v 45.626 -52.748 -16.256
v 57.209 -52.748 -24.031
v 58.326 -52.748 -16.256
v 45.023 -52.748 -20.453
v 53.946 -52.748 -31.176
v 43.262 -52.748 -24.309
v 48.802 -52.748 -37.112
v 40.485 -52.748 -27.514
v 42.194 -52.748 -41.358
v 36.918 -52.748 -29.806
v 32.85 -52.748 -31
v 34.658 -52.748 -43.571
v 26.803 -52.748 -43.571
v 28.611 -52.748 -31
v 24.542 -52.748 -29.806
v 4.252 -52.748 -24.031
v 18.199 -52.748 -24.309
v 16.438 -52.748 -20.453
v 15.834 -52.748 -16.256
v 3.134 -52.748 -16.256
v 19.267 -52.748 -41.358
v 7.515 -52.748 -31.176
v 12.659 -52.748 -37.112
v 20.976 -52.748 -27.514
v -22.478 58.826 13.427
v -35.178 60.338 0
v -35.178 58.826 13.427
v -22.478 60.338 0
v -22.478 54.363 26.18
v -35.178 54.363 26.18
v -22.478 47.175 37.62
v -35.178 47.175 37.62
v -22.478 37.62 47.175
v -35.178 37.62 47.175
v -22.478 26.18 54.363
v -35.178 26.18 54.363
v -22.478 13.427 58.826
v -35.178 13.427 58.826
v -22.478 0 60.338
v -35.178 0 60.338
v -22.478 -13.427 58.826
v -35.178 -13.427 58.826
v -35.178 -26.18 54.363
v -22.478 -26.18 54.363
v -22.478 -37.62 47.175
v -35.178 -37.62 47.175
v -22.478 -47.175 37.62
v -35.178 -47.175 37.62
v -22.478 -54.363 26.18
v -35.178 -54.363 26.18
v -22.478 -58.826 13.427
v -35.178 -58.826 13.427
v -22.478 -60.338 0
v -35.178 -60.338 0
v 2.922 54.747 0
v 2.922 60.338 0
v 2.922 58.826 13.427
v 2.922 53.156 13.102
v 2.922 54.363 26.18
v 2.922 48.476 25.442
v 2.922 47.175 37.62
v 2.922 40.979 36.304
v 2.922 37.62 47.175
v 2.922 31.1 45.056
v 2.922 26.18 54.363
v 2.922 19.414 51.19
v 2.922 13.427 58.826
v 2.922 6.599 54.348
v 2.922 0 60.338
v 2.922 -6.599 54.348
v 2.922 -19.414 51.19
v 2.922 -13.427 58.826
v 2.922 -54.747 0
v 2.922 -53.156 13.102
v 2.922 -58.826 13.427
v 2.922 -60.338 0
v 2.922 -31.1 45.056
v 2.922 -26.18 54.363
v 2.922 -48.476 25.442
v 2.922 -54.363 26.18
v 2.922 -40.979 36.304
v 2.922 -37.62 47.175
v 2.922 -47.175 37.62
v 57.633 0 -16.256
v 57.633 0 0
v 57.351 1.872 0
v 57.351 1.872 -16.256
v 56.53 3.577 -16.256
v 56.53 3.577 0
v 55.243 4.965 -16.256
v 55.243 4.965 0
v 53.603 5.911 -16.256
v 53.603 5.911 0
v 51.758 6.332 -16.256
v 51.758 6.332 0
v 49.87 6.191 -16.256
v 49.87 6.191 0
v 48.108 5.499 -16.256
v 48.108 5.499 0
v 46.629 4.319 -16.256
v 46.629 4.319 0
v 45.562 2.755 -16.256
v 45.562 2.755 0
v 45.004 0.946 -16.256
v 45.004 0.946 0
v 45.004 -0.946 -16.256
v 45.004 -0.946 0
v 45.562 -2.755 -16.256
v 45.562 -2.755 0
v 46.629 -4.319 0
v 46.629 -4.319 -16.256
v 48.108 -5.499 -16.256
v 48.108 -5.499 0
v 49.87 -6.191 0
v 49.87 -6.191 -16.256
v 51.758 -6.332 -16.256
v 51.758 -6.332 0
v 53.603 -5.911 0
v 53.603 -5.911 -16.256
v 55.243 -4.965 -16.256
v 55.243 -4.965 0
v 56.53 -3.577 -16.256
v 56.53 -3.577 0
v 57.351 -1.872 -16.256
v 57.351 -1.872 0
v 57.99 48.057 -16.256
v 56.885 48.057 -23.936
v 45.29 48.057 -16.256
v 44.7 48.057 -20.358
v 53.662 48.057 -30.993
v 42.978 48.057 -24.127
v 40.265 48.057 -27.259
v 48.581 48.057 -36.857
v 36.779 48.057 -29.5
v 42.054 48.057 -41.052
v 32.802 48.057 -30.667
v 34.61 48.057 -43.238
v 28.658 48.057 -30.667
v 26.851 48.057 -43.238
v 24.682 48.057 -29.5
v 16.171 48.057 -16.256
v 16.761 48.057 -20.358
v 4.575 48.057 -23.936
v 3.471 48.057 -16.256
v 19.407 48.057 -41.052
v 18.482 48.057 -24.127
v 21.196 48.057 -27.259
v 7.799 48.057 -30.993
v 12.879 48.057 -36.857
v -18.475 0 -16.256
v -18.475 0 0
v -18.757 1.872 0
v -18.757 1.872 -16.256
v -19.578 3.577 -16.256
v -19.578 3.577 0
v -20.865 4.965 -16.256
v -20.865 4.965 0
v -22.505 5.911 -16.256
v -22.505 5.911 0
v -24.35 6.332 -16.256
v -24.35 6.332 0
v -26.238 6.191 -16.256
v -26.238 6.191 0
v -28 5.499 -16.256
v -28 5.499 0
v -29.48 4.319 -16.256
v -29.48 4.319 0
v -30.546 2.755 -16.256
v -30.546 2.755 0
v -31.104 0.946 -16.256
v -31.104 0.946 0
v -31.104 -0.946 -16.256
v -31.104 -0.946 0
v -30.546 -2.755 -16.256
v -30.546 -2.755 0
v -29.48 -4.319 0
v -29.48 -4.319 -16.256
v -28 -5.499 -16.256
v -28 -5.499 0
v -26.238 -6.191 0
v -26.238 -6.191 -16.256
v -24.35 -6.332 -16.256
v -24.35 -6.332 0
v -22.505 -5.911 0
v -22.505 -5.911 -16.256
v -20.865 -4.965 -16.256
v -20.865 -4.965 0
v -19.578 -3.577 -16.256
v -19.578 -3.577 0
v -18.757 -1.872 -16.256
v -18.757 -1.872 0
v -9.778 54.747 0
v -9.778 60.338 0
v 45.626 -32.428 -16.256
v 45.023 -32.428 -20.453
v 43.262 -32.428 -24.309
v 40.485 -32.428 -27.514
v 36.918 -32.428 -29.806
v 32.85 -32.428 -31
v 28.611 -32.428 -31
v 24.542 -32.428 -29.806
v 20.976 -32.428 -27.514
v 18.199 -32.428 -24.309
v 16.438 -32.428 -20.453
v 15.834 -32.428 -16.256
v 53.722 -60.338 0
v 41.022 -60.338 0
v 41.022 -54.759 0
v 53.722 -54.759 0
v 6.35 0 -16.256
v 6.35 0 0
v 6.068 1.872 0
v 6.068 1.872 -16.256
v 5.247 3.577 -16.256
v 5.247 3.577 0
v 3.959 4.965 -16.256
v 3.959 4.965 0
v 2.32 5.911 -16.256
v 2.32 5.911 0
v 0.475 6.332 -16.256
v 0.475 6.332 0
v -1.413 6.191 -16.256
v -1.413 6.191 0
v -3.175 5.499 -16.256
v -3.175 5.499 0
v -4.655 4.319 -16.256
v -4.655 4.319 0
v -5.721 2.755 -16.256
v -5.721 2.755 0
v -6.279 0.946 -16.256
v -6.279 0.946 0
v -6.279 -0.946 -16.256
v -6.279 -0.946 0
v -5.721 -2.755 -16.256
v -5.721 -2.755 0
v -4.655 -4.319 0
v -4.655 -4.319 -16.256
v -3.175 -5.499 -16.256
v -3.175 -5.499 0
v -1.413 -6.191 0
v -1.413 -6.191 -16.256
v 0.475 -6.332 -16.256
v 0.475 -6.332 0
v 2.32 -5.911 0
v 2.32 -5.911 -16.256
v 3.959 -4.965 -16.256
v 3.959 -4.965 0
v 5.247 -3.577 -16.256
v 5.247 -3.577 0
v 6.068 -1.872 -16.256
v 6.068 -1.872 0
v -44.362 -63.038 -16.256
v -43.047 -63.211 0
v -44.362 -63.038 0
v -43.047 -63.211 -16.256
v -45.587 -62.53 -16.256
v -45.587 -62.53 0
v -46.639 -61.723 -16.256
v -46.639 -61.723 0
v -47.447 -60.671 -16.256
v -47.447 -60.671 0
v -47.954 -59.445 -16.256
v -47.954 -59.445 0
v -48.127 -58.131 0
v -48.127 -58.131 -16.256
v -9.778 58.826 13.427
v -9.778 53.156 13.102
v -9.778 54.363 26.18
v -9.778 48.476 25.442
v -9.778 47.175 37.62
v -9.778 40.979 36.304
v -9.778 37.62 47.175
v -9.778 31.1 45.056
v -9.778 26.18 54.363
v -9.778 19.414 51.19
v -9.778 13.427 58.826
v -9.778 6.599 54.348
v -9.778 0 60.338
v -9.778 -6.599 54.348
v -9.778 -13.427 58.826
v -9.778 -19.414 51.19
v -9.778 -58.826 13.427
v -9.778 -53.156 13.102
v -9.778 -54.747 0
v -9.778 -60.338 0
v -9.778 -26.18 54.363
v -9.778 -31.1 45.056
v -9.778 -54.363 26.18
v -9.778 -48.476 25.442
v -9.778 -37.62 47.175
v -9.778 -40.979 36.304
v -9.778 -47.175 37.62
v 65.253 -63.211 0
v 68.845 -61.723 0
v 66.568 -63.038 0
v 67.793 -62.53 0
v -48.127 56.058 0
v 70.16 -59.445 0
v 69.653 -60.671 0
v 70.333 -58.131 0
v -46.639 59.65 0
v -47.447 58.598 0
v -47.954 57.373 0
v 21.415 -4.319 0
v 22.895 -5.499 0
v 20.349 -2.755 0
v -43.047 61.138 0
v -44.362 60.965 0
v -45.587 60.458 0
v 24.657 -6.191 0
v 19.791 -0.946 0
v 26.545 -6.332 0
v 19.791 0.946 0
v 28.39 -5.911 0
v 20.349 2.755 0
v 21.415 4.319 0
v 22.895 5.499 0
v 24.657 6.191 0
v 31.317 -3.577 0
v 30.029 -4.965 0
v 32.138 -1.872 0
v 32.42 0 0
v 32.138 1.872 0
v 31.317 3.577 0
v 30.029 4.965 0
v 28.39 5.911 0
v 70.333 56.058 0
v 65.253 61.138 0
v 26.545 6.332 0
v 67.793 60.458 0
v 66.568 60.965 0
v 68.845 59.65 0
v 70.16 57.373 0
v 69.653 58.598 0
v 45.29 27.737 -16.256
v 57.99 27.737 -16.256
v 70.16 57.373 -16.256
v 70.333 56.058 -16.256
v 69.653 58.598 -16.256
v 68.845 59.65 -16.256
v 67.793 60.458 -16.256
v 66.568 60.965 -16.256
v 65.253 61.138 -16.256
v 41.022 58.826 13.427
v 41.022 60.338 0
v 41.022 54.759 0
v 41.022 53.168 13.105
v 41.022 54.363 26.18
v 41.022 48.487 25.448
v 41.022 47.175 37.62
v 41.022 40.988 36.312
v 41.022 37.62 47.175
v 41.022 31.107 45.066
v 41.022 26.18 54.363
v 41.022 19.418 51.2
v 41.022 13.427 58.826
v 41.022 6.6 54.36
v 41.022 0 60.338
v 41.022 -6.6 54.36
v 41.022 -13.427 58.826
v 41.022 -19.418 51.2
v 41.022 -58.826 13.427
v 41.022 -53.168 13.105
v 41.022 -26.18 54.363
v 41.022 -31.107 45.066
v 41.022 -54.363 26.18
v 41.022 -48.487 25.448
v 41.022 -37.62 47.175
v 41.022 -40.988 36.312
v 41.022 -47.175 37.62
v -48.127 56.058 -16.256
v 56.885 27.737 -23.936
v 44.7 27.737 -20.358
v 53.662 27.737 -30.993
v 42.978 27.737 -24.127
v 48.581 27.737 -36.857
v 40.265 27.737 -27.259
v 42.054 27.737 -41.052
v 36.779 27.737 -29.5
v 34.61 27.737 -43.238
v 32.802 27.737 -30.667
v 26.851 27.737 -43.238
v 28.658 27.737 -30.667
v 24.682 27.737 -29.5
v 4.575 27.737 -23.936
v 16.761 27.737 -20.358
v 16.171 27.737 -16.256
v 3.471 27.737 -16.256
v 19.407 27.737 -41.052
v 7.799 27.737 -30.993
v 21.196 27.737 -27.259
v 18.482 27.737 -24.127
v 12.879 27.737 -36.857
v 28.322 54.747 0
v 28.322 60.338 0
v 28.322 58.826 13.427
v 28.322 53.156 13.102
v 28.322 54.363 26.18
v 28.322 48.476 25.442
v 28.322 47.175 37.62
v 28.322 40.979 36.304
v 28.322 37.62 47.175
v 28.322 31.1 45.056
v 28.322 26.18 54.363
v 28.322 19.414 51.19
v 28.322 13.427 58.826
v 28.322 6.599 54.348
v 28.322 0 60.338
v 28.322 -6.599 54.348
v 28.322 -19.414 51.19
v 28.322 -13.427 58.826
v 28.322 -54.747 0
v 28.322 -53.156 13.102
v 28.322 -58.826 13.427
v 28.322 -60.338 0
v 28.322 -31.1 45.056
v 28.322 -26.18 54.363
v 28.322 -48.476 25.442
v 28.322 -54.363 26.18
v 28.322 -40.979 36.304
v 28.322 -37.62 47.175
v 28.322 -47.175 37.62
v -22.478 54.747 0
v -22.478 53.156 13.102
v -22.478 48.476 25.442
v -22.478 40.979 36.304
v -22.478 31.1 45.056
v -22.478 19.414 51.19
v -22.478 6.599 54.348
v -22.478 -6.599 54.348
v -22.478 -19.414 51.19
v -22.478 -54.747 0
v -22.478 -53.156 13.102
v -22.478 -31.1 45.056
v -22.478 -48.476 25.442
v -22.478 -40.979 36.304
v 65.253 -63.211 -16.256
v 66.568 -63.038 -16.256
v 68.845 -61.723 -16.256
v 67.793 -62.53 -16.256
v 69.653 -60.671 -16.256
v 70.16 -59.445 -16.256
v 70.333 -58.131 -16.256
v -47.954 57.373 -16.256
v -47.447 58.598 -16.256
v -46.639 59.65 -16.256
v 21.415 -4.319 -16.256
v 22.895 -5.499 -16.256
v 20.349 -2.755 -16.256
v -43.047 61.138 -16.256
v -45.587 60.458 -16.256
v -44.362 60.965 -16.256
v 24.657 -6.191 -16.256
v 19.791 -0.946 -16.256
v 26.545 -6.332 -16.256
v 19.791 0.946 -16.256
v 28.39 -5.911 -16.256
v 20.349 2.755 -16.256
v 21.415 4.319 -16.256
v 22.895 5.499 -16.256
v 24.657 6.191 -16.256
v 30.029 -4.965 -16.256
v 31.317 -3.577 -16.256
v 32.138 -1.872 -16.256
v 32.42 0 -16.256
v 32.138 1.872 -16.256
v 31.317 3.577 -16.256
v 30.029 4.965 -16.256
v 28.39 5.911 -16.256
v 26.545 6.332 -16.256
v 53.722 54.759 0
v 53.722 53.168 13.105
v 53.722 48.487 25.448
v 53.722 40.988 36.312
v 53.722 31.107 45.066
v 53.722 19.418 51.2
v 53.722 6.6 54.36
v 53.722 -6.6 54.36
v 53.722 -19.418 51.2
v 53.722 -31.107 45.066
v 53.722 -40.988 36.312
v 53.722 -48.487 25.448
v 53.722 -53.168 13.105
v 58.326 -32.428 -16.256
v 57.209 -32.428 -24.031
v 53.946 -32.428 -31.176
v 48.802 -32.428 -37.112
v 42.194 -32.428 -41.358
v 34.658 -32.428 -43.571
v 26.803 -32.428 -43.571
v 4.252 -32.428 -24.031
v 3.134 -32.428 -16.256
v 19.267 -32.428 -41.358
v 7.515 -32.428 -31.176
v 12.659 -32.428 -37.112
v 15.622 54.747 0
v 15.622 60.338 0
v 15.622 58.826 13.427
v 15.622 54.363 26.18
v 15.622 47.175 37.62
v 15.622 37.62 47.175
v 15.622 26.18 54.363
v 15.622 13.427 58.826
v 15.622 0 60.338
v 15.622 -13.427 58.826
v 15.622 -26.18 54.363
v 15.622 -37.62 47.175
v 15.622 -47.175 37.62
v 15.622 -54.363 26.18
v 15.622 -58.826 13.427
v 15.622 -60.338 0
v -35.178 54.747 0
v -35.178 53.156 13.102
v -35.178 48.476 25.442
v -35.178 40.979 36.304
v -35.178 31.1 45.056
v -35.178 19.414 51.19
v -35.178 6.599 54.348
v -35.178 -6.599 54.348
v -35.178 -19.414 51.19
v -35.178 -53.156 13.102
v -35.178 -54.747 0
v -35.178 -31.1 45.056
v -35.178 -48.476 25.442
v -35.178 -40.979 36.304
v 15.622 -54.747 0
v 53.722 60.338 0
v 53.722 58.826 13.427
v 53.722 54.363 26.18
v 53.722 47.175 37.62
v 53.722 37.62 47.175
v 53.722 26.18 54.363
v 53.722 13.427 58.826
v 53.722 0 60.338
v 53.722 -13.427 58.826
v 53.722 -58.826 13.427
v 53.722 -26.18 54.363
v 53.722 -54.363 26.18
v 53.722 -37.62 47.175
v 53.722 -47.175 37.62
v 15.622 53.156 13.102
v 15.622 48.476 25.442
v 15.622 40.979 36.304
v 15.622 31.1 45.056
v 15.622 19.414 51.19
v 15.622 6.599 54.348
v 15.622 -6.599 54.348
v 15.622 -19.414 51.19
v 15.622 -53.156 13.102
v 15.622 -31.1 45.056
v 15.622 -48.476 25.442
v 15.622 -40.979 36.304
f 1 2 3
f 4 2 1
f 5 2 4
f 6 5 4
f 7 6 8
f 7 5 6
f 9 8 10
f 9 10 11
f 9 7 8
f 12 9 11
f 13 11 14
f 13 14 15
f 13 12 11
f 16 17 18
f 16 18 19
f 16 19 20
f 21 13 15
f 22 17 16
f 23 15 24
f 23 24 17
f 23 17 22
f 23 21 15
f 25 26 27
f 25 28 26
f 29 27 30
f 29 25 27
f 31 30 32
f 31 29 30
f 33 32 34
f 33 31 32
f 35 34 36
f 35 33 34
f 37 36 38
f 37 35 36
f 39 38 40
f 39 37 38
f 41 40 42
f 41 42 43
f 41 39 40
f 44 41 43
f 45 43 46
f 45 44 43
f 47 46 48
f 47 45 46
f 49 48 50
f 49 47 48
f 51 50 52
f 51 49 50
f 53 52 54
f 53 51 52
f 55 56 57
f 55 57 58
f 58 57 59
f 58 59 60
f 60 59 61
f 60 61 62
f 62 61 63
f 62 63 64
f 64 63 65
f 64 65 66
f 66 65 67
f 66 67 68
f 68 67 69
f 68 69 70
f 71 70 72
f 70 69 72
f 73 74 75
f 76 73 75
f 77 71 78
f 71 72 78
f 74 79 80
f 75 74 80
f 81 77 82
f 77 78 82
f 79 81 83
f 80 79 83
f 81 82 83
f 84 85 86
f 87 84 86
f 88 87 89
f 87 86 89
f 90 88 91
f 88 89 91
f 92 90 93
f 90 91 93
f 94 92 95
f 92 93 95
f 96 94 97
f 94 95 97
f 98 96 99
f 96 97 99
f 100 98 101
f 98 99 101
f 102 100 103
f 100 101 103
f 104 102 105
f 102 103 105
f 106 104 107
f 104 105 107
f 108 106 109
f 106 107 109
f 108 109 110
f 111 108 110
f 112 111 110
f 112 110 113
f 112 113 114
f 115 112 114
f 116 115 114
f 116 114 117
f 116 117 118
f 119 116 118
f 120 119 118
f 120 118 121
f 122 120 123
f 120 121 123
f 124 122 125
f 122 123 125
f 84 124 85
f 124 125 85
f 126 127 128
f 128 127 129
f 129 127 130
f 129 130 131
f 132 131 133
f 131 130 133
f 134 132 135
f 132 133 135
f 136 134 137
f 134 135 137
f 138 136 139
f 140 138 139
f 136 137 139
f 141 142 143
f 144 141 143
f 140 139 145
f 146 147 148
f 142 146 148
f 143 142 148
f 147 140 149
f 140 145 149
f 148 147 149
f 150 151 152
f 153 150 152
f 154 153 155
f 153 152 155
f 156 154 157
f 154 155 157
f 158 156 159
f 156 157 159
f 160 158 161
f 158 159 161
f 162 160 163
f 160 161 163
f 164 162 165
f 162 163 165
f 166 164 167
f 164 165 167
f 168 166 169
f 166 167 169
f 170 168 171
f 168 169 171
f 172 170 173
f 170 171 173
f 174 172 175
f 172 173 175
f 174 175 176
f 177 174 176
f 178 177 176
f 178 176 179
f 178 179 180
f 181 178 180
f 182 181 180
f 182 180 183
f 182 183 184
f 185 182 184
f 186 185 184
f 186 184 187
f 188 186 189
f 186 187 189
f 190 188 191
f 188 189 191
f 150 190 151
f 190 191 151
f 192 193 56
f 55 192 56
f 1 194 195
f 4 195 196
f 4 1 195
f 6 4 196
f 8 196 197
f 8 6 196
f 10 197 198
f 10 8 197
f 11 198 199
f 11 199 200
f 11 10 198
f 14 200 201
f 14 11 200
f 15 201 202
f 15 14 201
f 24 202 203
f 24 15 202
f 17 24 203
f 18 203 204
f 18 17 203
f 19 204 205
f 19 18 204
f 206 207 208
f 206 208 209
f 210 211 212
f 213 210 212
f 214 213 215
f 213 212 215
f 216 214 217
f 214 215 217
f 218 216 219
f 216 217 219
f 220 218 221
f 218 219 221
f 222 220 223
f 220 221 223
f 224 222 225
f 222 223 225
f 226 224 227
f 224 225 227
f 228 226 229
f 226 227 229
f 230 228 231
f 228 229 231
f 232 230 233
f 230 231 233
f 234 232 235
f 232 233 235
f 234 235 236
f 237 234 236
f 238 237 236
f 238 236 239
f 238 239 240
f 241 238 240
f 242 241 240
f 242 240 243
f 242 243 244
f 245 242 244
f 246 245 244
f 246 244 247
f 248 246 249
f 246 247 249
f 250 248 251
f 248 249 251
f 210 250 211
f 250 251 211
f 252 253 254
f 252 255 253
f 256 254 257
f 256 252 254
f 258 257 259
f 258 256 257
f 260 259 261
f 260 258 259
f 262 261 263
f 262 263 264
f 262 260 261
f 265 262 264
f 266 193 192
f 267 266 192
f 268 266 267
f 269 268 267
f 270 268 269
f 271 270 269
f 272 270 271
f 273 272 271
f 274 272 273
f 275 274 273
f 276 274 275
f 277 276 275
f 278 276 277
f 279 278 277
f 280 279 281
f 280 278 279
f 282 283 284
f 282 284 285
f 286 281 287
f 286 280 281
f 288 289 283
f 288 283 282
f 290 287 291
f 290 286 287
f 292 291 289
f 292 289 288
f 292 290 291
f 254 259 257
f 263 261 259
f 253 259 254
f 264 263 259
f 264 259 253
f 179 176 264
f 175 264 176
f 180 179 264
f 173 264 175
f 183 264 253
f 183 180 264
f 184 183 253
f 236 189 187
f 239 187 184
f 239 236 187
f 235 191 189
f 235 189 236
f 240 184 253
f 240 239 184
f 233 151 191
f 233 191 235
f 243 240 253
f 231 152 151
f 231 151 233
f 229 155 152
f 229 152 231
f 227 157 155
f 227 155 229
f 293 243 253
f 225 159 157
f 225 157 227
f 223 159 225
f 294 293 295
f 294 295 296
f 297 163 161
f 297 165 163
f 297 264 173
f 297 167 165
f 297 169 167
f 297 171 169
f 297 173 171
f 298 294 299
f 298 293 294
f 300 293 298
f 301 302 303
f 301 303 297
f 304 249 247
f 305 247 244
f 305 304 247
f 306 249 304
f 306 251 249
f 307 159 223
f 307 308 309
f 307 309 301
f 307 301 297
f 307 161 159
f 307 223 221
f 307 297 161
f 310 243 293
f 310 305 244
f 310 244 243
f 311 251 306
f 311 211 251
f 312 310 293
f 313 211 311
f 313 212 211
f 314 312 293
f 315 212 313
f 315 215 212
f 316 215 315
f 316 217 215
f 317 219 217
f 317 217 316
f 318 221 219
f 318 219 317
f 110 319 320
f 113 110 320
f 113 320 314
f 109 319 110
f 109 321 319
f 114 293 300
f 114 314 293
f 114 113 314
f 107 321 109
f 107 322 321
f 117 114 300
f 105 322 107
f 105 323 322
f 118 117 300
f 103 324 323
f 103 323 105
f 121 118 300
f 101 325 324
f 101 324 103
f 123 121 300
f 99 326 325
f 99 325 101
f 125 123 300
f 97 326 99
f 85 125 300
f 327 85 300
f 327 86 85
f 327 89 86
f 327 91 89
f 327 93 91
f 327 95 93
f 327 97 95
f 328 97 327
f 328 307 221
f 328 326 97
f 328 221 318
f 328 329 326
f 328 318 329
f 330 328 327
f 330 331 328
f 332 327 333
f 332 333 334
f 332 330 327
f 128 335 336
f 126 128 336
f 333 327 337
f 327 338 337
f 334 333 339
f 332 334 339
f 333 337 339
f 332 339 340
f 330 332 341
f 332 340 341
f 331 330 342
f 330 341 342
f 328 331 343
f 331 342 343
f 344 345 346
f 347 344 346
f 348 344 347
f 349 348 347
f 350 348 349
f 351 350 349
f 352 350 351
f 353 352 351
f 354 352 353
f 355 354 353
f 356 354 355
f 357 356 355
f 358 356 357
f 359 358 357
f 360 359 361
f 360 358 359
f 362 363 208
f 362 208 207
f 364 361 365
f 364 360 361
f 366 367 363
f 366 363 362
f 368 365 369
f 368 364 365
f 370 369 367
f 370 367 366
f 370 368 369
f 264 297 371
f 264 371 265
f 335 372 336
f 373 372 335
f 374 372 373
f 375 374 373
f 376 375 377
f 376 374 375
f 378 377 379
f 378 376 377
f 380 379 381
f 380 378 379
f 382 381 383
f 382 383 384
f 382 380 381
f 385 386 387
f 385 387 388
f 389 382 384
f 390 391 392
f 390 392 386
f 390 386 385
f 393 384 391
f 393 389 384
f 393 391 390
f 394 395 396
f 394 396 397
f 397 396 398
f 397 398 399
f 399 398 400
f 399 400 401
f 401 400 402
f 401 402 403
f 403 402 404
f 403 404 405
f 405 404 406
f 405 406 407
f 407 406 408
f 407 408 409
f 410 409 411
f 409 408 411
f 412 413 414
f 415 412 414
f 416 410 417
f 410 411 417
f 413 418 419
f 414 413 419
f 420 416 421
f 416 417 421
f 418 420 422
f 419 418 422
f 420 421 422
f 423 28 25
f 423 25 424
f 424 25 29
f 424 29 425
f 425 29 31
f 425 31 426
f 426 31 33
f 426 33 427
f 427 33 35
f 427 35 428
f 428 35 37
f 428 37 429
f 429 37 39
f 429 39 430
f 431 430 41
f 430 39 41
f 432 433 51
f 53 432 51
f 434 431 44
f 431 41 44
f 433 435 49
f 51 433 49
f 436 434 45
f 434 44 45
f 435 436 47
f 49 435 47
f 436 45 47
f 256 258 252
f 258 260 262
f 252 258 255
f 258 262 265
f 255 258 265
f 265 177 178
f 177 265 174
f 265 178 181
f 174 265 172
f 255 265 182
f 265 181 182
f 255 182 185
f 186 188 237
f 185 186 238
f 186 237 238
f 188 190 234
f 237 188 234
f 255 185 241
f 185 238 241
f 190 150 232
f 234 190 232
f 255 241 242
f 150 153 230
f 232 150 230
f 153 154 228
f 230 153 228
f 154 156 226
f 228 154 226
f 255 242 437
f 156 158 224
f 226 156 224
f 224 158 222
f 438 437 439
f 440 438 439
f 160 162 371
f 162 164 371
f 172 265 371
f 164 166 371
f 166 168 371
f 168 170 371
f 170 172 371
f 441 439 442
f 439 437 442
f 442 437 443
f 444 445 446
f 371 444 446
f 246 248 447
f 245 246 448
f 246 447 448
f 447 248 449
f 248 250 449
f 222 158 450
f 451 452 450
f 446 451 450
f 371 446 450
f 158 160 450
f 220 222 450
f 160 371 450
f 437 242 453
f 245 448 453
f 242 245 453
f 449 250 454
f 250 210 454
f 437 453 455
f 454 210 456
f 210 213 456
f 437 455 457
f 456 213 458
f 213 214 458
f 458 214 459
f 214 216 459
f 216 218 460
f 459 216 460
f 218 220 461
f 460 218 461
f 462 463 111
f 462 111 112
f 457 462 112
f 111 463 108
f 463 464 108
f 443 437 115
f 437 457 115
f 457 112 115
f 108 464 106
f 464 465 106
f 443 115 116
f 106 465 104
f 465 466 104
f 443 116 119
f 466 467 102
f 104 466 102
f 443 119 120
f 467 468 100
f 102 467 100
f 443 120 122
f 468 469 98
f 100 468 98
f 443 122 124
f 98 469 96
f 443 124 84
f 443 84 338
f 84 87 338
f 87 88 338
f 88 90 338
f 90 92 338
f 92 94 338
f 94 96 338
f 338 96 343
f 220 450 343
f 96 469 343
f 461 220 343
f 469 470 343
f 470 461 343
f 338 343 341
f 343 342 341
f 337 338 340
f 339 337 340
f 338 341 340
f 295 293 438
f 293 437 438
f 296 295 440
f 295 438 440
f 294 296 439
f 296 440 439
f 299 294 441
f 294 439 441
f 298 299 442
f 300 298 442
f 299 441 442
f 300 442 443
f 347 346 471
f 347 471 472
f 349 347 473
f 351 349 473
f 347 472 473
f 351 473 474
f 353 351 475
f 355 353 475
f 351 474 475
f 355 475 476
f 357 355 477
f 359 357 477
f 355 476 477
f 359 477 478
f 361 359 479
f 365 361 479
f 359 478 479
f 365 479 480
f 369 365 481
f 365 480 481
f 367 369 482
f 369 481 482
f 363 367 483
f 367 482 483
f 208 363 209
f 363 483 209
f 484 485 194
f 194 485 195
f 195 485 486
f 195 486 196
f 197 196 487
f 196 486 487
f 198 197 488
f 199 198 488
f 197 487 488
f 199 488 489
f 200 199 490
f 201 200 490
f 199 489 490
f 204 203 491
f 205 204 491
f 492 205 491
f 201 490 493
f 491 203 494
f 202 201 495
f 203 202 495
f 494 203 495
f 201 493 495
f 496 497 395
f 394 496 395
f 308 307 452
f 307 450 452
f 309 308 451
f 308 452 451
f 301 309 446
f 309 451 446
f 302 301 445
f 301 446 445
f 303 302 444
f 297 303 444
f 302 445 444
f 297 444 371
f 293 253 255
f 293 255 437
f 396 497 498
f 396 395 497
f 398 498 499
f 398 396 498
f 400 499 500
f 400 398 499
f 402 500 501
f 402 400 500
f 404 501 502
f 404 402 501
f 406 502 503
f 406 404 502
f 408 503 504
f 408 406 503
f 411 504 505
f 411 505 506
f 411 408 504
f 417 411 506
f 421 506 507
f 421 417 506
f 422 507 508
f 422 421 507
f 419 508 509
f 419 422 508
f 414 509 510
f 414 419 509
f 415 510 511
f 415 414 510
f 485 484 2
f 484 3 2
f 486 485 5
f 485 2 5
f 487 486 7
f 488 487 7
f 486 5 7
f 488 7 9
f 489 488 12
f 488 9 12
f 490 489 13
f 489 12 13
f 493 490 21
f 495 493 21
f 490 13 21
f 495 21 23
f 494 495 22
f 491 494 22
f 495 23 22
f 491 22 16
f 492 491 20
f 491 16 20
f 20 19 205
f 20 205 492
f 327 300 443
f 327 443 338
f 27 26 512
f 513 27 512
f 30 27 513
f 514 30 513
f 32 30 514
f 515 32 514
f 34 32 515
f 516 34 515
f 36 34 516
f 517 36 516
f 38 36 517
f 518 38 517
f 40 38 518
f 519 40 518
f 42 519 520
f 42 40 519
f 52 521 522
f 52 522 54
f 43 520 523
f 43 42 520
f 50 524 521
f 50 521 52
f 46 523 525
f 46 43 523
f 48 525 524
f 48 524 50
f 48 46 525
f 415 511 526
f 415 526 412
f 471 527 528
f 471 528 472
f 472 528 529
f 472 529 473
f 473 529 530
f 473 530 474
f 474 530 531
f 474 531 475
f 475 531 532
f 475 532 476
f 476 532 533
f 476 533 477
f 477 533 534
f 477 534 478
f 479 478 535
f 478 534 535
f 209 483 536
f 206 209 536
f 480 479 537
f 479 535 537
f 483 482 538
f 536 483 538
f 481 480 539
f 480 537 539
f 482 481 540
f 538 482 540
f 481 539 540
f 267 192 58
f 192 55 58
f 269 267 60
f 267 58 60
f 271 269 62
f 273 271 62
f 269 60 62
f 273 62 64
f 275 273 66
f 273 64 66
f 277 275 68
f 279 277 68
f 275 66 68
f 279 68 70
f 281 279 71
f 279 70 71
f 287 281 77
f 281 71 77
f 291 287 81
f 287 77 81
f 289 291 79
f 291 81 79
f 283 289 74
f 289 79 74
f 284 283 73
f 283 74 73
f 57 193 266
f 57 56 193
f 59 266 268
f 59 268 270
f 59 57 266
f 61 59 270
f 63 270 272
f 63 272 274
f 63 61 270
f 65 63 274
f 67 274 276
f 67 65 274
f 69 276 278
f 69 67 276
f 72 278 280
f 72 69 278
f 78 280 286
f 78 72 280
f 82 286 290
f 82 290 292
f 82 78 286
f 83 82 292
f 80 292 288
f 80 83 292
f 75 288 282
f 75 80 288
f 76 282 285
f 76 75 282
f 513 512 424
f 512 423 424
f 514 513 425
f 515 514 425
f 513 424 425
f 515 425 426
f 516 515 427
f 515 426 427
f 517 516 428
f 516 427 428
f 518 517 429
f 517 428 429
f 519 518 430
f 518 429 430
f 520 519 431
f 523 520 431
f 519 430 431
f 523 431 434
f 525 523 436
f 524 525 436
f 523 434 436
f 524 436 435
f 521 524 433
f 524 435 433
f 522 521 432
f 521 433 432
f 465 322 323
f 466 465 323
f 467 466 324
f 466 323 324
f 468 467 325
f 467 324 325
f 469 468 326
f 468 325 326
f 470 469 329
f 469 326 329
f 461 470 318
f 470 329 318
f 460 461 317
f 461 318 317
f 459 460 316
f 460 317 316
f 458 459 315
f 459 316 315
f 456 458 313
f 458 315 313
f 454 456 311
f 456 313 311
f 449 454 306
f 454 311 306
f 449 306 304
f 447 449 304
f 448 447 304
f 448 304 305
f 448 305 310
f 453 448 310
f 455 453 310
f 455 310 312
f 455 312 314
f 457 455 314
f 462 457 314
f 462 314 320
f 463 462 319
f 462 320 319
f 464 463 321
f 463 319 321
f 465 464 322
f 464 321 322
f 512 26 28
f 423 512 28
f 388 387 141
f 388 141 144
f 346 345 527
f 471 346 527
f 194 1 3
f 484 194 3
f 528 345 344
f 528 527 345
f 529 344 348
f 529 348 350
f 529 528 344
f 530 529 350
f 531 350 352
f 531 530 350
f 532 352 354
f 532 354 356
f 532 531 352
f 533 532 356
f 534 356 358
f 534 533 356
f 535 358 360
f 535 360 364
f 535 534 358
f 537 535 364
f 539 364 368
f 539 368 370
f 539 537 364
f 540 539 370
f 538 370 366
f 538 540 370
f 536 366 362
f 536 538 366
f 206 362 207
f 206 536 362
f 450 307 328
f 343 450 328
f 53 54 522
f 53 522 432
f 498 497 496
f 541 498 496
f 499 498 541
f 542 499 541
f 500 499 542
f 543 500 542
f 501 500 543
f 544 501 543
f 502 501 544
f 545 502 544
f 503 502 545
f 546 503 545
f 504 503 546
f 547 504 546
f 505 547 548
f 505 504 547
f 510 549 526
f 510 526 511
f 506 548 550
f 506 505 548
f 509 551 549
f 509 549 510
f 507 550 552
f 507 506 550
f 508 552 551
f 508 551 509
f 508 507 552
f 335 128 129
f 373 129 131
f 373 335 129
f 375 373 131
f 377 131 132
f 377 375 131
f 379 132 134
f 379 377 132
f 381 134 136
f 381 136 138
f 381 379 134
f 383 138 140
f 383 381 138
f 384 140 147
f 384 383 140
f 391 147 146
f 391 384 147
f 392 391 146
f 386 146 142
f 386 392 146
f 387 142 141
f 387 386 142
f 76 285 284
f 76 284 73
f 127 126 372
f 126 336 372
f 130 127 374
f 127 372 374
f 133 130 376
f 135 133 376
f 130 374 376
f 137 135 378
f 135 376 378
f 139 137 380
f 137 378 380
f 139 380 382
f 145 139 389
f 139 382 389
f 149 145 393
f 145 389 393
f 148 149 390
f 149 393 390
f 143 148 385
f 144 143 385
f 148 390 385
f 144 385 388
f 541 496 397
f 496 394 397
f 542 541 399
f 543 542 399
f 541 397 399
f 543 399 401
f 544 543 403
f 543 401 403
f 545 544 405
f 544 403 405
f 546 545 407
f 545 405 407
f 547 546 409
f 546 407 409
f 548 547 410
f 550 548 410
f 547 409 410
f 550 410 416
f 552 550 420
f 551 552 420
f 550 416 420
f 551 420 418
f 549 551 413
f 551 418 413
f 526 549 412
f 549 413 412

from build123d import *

# Parameters (mm, degrees)
F0_W     = 12.7
F0_H     = 5.5795572698
F1_ANGLE = 180
F0_H_2   = 5.5912099779
F2_W     = 118.4605003471
F2_H     = 44.6357212043
F2_H_2   = 40.7499843153
F2_R     = 6.35
F2_H_3   = 38.9630381748
F3_DEPTH = 16.256
F4_R     = 5.08
F5_W     = 12.7
F5_H     = 20.32
F6_ANGLE = 180


with BuildPart() as f1:
    # F0 (on Top) → F1 (revolve)
    with BuildSketch(Plane.XY):
        with Locations((47.3719570518, 57.5487148017)):
            Rectangle(F0_W, F0_H)
    revolve(axis=Axis((3.7274751812, 0, 0), (1, 0, 0)), revolution_arc=F1_ANGLE)


with BuildPart() as f1b:
    # F0 (on Top) → F1, piece 2 (revolve)
    with BuildSketch(Plane.XY):
        with Locations((21.9719570518, 57.5428884476)):
            Rectangle(F0_W, F0_H_2)
    revolve(axis=Axis((3.7274751812, 0, 0), (1, 0, 0)), revolution_arc=F1_ANGLE)


with BuildPart() as f1c:
    # F0 (on Top) → F1, piece 3 (revolve)
    with BuildSketch(Plane.XY):
        with Locations((-3.4280429482, 57.5428884476)):
            Rectangle(F0_W, F0_H_2)
    revolve(axis=Axis((3.7274751812, 0, 0), (1, 0, 0)), revolution_arc=F1_ANGLE)


with BuildPart() as f1d:
    # F0 (on Top) → F1, piece 4 (revolve)
    with BuildSketch(Plane.XY):
        with Locations((-28.8280429482, 57.5428884476)):
            Rectangle(F0_W, F0_H_2)
    revolve(axis=Axis((3.7274751812, 0, 0), (1, 0, 0)), revolution_arc=F1_ANGLE)


with BuildPart() as f3:
    # F2 (on Top) → F3 (new body)
    with BuildSketch(Plane.XY):
        with Locations((11.1031317058, -40.8927433193)):
            Rectangle(F2_W, F2_H)
        with Locations((11.1031317058, 1.8001094405)):
            Rectangle(F2_W, F2_H_2)
        with Locations((-24.8246304691, 0)):
            Circle(F2_R, mode=Mode.SUBTRACT)
        Circle(F2_R, mode=Mode.SUBTRACT)
        with Locations((26.0701384395, 0)):
            Circle(F2_R, mode=Mode.SUBTRACT)
        with Locations((51.2833818793, 0)):
            Circle(F2_R, mode=Mode.SUBTRACT)
        with Locations((11.1031317058, 41.6566206855)):
            Rectangle(F2_W, F2_H_3)
    extrude(amount=-F3_DEPTH)

    # F4
    f4_edges = [f3.edges().sort_by_distance(p)[0] for p in [
        (-48.127118, 61.13814, -8.128),
        (-48.127118, -63.210604, -8.128),
        (70.333382, -63.210604, -8.128),
        (70.333382, 61.13814, -8.128),
    ]]
    fillet(f4_edges, radius=F4_R)


with BuildPart() as f6:
    # F5 (on face) → F6 (revolve)
    with BuildSketch(Plane(origin=(0, 0, -16.256), x_dir=(1, 0, 0), z_dir=(0, 0, -1))):
        with Locations((51.9764303348, 42.5882383884)):
            Rectangle(F5_W, F5_H)
    revolve(axis=Axis((30.7304244488, -1.0362320742, -16.256), (0, 1, 0)), revolution_arc=F6_ANGLE)


with BuildPart() as f6b:
    # F5 (on face) → F6, piece 2 (revolve)
    with BuildSketch(Plane(origin=(0, 0, -16.256), x_dir=(1, 0, 0), z_dir=(0, 0, -1))):
        with Locations((51.6396296067, -37.8969784529)):
            Rectangle(F5_W, F5_H)
    revolve(axis=Axis((30.7304244488, -1.0362320742, -16.256), (0, 1, 0)), revolution_arc=F6_ANGLE)


solid = Compound([f1.part, f1b.part, f1c.part, f1d.part, f3.part, f6.part, f6b.part])
